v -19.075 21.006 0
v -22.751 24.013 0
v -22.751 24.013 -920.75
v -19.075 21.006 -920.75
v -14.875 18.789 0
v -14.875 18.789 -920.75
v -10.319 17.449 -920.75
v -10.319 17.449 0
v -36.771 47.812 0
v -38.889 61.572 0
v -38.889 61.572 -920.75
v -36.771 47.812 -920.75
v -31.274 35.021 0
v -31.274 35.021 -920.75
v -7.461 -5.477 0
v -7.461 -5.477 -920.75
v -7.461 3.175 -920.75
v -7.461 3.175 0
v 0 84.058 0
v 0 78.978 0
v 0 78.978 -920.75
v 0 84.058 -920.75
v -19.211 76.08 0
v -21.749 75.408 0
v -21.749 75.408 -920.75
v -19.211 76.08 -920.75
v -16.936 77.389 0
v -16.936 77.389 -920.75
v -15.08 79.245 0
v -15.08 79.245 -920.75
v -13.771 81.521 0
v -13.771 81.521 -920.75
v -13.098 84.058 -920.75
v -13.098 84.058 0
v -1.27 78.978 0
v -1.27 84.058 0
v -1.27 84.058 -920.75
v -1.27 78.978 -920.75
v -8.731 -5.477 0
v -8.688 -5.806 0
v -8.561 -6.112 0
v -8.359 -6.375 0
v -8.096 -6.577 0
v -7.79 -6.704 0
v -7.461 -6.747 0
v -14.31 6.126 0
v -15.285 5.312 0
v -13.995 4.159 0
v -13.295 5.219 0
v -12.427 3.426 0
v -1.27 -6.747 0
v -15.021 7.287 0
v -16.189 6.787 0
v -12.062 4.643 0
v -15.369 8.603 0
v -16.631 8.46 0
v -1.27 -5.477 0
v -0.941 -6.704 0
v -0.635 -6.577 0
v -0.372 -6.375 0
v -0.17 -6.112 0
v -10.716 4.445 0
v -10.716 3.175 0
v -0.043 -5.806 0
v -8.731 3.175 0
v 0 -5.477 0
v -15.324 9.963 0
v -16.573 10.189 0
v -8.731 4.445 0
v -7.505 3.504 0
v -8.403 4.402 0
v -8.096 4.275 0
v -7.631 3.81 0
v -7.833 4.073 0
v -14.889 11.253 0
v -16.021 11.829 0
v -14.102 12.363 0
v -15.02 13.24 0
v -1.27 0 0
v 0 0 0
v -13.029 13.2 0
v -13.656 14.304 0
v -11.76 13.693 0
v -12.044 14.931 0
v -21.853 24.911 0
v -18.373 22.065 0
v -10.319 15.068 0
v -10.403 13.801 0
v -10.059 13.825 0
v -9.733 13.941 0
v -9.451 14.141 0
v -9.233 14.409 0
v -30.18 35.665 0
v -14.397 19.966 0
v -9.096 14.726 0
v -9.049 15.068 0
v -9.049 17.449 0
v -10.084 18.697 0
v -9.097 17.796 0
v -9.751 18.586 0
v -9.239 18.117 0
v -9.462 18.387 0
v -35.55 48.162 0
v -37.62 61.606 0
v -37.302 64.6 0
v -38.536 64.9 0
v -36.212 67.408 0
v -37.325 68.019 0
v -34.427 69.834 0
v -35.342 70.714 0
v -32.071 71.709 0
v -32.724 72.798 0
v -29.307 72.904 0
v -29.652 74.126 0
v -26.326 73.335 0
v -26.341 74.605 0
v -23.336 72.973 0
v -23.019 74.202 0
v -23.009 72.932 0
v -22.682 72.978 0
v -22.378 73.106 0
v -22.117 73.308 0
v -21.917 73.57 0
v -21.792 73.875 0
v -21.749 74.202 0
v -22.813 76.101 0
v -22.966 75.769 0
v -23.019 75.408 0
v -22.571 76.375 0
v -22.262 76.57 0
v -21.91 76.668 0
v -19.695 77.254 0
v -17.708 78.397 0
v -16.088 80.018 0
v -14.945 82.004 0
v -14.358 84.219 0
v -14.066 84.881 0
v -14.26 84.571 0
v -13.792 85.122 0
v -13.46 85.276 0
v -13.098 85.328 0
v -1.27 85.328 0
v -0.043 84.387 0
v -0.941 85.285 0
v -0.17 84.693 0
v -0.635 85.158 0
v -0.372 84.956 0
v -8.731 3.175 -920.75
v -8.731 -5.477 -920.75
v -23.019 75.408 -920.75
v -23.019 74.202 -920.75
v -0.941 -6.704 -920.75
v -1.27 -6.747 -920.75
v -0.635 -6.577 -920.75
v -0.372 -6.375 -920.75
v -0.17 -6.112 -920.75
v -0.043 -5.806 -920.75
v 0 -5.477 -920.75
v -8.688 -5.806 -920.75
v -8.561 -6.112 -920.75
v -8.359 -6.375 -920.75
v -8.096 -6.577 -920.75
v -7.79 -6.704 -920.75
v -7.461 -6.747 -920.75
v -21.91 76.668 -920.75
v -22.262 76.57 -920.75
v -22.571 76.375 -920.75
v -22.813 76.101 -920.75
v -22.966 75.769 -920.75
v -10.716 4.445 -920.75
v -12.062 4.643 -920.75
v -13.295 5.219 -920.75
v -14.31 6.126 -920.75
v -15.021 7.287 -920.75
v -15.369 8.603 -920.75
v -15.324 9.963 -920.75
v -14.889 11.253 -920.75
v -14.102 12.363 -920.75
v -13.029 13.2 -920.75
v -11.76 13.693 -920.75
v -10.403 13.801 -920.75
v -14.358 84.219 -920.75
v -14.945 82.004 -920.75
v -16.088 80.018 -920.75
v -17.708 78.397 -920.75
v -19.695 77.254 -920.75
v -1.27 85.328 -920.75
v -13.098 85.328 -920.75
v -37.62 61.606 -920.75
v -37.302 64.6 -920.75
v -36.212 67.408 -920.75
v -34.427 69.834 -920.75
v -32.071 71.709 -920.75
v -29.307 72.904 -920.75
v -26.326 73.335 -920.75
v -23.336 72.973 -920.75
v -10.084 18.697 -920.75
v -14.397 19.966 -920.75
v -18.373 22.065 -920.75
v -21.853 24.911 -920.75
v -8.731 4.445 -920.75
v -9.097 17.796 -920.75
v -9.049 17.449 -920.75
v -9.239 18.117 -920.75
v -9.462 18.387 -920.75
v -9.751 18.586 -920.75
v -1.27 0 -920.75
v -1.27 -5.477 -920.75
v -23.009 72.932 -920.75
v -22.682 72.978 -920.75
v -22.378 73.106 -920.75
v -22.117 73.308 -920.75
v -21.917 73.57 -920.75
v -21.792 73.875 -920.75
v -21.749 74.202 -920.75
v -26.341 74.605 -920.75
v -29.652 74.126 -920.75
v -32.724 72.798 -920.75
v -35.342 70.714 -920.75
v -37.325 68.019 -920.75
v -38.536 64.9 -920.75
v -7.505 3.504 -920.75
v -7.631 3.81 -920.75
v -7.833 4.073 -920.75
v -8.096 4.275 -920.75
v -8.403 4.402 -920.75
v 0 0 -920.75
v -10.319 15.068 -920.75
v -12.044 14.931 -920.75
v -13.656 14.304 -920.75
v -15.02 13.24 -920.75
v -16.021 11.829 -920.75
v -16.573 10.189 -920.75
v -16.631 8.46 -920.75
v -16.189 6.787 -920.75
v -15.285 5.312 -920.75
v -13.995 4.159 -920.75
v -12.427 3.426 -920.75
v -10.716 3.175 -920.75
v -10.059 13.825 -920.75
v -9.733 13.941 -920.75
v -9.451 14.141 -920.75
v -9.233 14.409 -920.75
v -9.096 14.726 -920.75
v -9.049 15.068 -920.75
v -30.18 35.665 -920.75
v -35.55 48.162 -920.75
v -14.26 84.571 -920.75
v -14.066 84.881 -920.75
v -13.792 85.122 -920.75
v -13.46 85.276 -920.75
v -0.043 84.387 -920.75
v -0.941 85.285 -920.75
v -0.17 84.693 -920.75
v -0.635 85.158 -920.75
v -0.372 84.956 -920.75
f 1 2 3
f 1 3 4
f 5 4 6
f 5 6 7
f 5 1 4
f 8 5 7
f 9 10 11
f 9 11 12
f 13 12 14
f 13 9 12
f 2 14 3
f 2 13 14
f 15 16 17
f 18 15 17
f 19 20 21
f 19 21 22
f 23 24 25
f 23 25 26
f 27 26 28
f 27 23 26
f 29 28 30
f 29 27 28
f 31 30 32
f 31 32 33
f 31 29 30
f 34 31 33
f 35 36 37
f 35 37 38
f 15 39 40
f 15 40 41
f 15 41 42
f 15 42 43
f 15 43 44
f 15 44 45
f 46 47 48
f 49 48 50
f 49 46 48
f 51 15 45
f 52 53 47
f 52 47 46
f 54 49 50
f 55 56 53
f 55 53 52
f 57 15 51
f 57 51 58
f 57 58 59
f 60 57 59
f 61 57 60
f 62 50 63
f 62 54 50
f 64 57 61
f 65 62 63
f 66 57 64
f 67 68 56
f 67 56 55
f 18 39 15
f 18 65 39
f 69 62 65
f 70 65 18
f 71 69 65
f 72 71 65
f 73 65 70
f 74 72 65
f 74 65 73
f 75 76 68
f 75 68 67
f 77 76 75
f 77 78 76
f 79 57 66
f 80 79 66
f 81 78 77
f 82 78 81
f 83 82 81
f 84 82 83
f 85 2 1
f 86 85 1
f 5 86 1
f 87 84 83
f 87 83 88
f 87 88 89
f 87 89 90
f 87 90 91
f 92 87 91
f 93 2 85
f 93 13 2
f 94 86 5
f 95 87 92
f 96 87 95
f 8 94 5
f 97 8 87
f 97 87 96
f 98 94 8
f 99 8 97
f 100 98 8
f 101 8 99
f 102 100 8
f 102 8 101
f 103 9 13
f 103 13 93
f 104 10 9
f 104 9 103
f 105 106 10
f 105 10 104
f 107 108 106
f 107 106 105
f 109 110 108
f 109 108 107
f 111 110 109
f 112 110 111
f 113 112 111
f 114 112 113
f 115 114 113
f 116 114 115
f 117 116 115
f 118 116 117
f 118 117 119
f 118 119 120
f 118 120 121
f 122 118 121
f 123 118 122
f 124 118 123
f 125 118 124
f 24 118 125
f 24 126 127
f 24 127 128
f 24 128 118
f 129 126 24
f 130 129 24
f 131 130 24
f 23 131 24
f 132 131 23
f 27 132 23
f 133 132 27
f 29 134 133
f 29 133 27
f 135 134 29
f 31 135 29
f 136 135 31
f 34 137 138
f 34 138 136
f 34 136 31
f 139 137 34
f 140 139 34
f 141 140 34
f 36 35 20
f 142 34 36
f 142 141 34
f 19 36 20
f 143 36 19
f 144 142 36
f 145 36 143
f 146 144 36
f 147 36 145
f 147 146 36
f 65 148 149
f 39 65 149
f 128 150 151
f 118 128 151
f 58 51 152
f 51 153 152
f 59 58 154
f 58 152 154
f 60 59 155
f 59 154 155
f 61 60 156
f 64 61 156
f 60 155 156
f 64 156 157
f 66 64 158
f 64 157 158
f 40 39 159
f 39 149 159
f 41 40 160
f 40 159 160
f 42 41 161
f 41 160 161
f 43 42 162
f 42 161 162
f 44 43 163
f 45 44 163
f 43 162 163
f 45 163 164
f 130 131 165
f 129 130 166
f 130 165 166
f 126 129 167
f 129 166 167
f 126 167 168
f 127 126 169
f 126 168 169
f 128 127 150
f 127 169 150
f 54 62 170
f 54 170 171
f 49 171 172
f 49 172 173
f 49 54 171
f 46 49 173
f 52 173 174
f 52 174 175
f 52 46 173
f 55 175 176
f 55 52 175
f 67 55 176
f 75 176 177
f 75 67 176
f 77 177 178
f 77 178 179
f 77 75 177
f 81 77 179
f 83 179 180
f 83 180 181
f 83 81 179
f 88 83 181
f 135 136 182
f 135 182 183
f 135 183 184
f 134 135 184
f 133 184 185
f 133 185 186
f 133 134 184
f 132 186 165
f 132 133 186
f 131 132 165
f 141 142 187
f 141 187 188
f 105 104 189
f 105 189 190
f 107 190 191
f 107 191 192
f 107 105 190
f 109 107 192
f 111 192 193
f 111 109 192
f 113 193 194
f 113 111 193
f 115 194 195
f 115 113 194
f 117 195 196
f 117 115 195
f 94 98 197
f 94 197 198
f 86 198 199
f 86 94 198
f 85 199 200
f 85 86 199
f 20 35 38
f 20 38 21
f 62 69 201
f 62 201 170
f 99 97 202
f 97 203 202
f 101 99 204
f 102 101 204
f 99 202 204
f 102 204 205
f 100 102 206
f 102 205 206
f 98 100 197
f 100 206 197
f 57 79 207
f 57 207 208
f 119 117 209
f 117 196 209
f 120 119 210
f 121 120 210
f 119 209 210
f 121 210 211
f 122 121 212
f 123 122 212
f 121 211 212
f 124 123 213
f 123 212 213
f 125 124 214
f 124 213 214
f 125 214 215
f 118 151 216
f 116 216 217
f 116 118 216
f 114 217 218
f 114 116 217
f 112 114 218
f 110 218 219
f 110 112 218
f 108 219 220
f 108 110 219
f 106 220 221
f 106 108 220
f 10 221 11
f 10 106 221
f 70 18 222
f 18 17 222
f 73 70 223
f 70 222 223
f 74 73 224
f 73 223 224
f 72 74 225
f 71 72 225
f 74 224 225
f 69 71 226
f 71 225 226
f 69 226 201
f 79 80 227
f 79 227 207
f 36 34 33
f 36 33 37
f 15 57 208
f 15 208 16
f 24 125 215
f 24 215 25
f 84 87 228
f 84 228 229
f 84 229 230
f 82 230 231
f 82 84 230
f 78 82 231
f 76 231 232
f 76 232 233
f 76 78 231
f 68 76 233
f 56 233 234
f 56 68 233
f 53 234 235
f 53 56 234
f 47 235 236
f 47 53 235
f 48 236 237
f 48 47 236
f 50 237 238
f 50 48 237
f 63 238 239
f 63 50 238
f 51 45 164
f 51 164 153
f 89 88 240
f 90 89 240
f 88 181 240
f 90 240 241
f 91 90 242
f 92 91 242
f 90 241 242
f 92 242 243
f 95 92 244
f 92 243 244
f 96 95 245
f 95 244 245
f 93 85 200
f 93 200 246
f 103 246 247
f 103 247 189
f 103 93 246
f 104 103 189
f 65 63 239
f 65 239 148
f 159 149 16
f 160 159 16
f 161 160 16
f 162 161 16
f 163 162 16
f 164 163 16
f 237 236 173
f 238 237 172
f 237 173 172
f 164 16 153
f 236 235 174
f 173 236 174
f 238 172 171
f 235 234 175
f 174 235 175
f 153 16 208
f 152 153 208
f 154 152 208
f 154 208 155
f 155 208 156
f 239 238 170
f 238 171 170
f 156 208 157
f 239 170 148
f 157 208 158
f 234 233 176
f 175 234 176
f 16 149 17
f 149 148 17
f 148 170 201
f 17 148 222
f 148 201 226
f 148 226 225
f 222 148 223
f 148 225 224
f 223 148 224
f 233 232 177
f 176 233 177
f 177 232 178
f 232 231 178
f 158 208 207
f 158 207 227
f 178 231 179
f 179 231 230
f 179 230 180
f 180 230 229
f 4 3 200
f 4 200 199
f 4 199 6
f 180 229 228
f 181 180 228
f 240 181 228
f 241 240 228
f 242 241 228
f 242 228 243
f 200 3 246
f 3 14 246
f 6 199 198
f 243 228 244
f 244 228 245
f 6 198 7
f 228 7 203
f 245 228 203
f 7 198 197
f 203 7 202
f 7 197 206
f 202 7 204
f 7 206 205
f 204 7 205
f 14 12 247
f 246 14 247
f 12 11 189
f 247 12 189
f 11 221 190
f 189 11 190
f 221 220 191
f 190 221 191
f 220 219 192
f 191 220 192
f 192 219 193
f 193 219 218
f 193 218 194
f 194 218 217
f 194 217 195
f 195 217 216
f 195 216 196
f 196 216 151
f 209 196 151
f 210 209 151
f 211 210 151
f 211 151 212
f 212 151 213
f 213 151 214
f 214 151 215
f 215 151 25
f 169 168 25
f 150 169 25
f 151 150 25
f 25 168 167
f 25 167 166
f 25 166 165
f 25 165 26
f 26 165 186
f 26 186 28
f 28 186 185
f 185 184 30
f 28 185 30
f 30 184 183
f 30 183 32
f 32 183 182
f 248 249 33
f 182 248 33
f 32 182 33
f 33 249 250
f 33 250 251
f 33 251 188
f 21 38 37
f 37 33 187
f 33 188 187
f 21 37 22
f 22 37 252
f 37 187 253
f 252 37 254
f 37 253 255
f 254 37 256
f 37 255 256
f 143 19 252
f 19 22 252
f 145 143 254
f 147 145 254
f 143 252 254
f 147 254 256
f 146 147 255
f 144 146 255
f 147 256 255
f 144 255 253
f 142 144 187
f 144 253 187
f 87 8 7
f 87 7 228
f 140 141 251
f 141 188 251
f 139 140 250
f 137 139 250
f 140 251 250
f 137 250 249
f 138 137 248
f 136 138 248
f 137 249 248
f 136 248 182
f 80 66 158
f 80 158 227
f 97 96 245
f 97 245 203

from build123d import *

# Parameters (mm, degrees)
EXTRUDE_THIN1_DEPTH = 920.75
FILLET1_R           = 1.27


with BuildPart() as part:
    # Sketch3 → Extrude-Thin1 (new body)
    with BuildSketch(Plane.XY):
        with BuildLine():
            Line((0, 78.978125), (0, 85.328125))
            Line((0, 85.328125), (-14.2875, 85.328125))
            ThreePointArc((-14.2875, 85.328125), (-16.844823917, 79.154198917), (-23.01875, 76.596875))
            Line((-23.01875, 76.596875), (-23.01875, 74.202381102))
            ThreePointArc((-23.01875, 74.202381102), (-34.102024757, 71.842921697), (-38.889371992, 61.572218972))
            ThreePointArc((-38.889371992, 61.572218972), (-34.427603857, 41.242325722), (-22.75075149, 24.012611469))
            ThreePointArc((-22.75075149, 24.012611469), (-17.030138602, 19.792593223), (-10.31875, 17.449256102))
            Line((-10.31875, 17.449256102), (-10.31875, 15.068006102))
            ThreePointArc((-10.31875, 15.068006102), (-16.665438104, 9.326672958), (-10.715625, 3.175))
            Line((-10.715625, 3.175), (-8.73125, 3.175))
            Line((-8.73125, 3.175), (-8.73125, -6.746875))
            Line((-8.73125, -6.746875), (0, -6.746875))
            Line((0, -6.746875), (0, 0))
            Line((0, 0), (-1.27, 0))
            Line((-1.27, 0), (-1.27, -5.476875))
            Line((-1.27, -5.476875), (-7.46125, -5.476875))
            Line((-7.46125, -5.476875), (-7.46125, 4.445))
            Line((-7.46125, 4.445), (-10.715625, 4.445))
            ThreePointArc((-10.715625, 4.445), (-15.321439486, 9.975552095), (-9.04875, 13.504560479))
            Line((-9.04875, 13.504560479), (-9.04875, 18.527286753))
            ThreePointArc((-9.04875, 18.527286753), (-15.97058408, 20.676234022), (-21.852725878, 24.910637081))
            ThreePointArc((-21.852725878, 24.910637081), (-33.260758622, 41.743696042), (-37.619809793, 61.605562972))
            ThreePointArc((-37.619809793, 61.605562972), (-32.636426474, 71.346888762), (-21.74875, 72.435942687))
            Line((-21.74875, 72.435942687), (-21.74875, 75.407837627))
            ThreePointArc((-21.74875, 75.407837627), (-15.946798305, 78.256173305), (-13.098462627, 84.058125))
            Line((-13.098462627, 84.058125), (-1.27, 84.058125))
            Line((-1.27, 84.058125), (-1.27, 78.978125))
            Line((-1.27, 78.978125), (0, 78.978125))
        make_face()
    extrude(amount=-EXTRUDE_THIN1_DEPTH)

    # Fillet1
    fillet1_edges = [part.edges().sort_by_distance(p)[0] for p in [
        (0, -6.746875, -460.375),
        (-8.73125, -6.746875, -460.375),
        (-23.01875, 76.596875, -460.375),
        (-14.2875, 85.328125, -460.375),
        (0, 85.328125, -460.375),
        (-21.74875, 72.435942687, -460.375),
        (-9.04875, 18.527286753, -460.375),
        (-9.04875, 13.504560479, -460.375),
        (-7.46125, 4.445, -460.375),
    ]]
    fillet(fillet1_edges, radius=FILLET1_R)


solid = part.part
